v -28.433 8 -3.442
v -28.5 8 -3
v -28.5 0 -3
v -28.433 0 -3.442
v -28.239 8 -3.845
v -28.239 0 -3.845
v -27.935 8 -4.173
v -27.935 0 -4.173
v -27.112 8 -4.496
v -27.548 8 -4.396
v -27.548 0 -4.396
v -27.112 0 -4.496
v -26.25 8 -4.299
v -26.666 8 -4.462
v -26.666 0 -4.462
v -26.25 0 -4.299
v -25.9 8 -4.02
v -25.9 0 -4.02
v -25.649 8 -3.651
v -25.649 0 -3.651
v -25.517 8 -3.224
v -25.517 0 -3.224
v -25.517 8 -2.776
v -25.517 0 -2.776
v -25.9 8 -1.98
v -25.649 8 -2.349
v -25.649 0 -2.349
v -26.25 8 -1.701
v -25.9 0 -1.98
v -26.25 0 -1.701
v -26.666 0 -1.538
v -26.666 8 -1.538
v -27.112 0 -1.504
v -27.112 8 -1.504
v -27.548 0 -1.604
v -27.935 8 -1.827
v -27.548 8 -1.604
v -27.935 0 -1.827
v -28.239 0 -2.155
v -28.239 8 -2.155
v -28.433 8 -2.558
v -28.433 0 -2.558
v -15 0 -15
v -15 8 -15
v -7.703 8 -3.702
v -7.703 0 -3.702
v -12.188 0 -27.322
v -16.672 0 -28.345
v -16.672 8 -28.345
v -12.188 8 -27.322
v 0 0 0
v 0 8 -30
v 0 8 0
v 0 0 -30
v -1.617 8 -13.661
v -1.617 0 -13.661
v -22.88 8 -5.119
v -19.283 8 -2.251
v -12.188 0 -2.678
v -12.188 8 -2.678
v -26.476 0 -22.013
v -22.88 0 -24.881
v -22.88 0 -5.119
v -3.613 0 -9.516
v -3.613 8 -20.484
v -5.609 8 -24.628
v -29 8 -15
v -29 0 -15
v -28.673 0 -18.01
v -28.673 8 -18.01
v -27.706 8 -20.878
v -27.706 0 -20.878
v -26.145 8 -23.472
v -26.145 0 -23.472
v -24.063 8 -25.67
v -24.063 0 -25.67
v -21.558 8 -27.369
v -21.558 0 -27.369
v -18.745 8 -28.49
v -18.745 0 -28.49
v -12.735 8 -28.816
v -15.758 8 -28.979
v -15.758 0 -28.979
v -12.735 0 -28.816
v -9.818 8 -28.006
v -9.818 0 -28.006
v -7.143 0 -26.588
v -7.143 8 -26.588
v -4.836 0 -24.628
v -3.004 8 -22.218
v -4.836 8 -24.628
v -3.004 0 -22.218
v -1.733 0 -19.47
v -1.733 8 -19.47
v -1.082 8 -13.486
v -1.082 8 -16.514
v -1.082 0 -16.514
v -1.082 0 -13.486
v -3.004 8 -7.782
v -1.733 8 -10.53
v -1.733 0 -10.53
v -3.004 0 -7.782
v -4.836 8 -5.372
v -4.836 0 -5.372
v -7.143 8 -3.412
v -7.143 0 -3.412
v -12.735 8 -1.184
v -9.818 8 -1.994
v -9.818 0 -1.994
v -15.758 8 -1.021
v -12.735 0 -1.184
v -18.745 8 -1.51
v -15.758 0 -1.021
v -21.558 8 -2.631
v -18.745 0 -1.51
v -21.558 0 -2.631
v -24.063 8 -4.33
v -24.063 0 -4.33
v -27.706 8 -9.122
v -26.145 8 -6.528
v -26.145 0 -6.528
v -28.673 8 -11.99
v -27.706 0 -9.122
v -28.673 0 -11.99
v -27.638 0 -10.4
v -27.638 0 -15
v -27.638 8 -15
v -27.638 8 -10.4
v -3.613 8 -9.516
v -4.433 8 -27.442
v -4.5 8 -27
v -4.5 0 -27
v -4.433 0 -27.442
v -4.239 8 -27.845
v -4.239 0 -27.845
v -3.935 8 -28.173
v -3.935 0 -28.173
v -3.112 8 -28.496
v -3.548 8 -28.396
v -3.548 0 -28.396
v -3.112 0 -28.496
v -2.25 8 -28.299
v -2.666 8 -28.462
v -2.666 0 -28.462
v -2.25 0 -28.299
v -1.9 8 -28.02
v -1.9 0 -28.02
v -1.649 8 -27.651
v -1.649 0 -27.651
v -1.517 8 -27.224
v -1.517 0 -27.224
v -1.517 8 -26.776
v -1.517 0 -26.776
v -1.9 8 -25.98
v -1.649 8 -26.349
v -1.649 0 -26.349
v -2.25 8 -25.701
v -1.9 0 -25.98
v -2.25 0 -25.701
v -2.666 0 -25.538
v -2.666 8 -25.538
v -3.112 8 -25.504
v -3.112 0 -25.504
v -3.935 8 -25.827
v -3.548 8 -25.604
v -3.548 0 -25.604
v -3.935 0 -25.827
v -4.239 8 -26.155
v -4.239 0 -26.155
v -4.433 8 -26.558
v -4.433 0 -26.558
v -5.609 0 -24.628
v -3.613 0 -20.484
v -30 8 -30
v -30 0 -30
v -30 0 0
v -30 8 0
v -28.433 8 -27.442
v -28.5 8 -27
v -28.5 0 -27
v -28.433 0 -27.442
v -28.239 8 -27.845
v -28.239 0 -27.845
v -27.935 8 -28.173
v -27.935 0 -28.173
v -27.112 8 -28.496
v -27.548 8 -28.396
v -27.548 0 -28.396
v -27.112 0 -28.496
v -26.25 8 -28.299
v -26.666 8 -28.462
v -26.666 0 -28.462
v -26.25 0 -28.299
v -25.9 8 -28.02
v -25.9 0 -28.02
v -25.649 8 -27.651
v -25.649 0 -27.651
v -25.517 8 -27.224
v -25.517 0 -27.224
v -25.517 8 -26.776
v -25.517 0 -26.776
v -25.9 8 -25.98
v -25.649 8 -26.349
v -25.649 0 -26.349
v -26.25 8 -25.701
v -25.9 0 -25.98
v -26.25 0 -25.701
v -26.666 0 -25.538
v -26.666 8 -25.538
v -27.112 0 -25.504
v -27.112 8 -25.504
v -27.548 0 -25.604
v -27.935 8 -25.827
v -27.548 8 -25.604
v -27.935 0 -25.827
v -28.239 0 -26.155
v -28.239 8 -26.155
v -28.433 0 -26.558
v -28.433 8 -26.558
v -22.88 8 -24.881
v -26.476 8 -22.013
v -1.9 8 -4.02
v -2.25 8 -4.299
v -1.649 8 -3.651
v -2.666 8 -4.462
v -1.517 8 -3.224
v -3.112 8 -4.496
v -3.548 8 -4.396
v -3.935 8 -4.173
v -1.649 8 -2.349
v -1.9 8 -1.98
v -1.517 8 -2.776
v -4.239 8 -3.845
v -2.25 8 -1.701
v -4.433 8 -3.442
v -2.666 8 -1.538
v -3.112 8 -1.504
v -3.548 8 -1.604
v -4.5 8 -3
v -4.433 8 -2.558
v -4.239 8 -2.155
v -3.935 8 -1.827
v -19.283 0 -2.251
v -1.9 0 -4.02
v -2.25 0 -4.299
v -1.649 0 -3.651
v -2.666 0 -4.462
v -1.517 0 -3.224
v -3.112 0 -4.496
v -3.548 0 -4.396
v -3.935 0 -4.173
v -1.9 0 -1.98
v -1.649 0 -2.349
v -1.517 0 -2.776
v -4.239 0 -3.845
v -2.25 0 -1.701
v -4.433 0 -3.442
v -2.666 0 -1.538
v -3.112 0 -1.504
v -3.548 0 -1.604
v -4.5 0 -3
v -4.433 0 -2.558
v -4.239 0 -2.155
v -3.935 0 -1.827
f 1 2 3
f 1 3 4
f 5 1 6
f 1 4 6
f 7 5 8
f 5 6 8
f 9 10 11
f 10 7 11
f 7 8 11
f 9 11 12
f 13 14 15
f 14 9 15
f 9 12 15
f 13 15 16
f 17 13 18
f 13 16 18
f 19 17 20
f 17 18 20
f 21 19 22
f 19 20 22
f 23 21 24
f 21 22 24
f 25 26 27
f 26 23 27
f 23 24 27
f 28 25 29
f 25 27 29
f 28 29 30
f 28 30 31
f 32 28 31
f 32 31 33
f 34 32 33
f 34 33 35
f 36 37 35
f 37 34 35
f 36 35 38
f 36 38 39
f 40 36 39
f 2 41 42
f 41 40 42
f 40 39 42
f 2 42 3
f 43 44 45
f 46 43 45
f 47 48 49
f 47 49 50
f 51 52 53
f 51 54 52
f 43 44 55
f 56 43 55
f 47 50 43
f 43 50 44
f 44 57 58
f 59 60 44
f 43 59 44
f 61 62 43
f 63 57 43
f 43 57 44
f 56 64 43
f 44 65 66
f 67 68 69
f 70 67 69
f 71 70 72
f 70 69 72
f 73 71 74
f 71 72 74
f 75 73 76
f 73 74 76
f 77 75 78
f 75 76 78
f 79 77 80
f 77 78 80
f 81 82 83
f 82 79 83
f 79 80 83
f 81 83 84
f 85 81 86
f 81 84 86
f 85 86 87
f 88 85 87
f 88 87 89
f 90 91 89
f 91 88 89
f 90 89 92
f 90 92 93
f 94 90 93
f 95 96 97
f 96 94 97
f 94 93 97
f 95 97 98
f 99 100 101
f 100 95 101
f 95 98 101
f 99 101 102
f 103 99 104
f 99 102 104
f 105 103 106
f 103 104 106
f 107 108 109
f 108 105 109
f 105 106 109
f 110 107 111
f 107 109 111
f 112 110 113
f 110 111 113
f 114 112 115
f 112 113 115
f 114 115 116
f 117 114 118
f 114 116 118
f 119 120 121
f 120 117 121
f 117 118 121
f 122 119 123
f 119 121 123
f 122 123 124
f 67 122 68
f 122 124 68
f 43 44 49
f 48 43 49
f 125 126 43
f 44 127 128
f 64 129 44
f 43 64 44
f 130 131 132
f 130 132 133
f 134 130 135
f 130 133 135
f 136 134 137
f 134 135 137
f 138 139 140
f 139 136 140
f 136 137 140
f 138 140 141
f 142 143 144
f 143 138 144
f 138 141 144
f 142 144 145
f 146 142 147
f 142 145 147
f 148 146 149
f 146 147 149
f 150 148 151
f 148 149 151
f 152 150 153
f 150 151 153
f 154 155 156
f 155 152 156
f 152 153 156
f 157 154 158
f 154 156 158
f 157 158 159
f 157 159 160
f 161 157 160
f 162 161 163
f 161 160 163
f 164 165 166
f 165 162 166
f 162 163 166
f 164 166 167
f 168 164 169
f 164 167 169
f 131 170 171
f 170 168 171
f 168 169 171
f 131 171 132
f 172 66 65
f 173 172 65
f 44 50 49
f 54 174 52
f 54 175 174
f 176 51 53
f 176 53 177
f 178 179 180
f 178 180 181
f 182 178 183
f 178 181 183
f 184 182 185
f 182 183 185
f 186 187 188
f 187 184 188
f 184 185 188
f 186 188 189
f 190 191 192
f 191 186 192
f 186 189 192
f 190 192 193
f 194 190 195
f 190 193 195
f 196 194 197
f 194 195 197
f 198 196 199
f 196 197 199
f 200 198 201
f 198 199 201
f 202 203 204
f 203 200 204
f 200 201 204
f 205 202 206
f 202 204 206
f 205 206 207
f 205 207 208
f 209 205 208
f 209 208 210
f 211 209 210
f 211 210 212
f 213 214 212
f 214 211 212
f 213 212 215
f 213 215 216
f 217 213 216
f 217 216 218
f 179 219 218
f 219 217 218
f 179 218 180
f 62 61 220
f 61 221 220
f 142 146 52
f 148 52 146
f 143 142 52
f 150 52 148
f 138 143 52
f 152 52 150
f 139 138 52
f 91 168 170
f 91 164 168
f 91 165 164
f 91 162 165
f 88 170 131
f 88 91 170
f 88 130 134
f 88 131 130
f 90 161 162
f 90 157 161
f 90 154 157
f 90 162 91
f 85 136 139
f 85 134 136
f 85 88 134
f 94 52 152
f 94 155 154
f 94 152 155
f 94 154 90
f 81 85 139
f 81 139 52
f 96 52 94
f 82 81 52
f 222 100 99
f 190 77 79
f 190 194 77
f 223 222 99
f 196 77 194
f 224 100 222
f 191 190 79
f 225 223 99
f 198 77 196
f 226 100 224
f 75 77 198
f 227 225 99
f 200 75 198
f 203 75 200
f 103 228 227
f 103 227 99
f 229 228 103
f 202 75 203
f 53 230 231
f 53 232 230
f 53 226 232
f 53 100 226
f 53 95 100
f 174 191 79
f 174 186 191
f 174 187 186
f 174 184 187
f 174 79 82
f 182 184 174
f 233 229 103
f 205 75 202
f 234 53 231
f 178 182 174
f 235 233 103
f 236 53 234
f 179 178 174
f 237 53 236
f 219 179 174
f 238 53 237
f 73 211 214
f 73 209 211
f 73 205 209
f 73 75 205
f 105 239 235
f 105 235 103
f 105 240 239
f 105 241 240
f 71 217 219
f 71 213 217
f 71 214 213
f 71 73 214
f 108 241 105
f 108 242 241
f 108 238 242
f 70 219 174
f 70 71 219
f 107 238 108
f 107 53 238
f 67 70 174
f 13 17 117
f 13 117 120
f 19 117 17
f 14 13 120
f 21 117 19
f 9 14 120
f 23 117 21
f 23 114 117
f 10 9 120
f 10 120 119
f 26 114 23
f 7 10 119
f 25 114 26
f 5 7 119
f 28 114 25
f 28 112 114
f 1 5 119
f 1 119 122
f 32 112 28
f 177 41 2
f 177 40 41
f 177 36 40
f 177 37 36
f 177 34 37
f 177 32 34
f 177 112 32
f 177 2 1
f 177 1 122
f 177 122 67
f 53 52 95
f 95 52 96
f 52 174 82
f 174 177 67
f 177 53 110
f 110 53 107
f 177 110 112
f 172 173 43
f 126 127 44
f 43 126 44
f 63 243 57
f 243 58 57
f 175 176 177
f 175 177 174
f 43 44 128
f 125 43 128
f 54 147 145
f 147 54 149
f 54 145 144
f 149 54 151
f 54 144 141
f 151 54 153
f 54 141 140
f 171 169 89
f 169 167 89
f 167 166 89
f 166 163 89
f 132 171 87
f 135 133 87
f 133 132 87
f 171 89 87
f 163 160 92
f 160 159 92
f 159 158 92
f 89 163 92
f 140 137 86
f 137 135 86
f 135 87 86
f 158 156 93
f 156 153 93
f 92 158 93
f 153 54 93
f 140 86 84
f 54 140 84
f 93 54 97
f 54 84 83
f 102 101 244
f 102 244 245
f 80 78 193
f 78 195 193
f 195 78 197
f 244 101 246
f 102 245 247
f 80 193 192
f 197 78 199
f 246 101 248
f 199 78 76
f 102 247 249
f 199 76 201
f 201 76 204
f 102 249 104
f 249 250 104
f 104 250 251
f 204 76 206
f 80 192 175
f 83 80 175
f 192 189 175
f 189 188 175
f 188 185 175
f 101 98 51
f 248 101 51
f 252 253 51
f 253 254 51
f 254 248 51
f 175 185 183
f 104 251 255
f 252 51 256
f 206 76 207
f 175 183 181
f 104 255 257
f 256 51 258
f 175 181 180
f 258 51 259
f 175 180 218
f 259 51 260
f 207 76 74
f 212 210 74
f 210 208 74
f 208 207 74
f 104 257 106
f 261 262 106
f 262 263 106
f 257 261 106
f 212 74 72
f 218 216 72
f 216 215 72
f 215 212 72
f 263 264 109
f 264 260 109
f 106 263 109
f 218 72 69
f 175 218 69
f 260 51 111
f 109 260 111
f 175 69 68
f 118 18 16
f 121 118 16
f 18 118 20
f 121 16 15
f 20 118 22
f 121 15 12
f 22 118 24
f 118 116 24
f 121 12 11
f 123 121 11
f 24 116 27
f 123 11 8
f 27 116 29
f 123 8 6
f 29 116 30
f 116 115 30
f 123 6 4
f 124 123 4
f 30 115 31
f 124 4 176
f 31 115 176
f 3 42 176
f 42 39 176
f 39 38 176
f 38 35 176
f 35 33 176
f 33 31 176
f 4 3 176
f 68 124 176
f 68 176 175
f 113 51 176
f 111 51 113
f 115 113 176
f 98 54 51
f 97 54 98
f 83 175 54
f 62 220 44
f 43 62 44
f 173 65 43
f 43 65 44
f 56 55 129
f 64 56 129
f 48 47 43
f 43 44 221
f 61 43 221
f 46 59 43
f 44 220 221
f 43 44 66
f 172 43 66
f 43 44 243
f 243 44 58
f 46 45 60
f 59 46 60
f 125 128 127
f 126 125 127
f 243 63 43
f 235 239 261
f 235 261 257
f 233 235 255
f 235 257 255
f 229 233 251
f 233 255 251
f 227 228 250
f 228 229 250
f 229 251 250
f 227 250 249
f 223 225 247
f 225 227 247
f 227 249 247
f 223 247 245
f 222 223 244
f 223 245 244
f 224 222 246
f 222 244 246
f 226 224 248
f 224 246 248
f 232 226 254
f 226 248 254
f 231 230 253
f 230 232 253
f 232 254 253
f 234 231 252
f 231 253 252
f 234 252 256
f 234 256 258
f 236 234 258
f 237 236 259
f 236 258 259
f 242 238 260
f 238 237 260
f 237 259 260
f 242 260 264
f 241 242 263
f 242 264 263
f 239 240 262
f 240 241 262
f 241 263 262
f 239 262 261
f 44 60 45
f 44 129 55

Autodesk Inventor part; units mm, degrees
ref_plane "YZ Plane" through (0, 0, 0) normal (1, 0, 0) x (0, 1, 0)
ref_plane "XZ Plane" through (0, 0, 0) normal (0, 1, 0) x (-1, 0, 0)
ref_plane "XY Plane" through (0, 0, 0) normal (0, 0, 1) x (1, 0, 0)
sketch "Sketch1" plane through (0, 0, 0) normal (0, 1, 0) x (-1, 0, 0)
  line L0 (0, 0) -> (30, 0)
  line L1 (30, 0) -> (30, -30)
  line L2 (30, -30) -> (0, -30)
  line L3 (0, -30) -> (0, 0)
  circle A0 centre (3, -3) radius 1.5
  circle A1 centre (3, -27) radius 1.5
  circle A2 centre (27, -3) radius 1.5
  circle A3 centre (27, -27) radius 1.5
  circle A4 centre (15, -15) radius 14
  dimension "d0" = 30
  dimension "d1" = 30
  dimension "d2" = 3
  dimension "d3" = 24
  dimension "d4" = 24
  dimension "d5" = 3
  dimension "d6" = 3
  dimension "d7" = 28
  dimension "d8" = 15
  dimension "d9" = 15
extrude "Extrusion1" add sketch "Sketch1" along normal blind 8
sketch "Sketch2" plane through (0, 8, 0) normal (0, 1, 0) x (1, 0, 0)
  circle A0 centre (-15, 15) radius 14 projected
  line L0 (-15, 15) -> (-27.6384, 10.4)
  line L1 (-27.6384, 10.4) -> (-27.6384, 15)
  line L2 (-27.6384, 15) -> (-15, 15)
  dimension "d12" = 70
  dimension "d13" = 4.6
extrude "Extrusion2" add sketch "Sketch2" against normal blind 8 contours L0 L1 L2
pattern_circular "Circular Pattern1" count 7 over 360 about axis through (-15, 8, -15) along (0, -1, 0) of "Extrusion2"
properties part number "Fan30mm" material "ABS Plastic"
